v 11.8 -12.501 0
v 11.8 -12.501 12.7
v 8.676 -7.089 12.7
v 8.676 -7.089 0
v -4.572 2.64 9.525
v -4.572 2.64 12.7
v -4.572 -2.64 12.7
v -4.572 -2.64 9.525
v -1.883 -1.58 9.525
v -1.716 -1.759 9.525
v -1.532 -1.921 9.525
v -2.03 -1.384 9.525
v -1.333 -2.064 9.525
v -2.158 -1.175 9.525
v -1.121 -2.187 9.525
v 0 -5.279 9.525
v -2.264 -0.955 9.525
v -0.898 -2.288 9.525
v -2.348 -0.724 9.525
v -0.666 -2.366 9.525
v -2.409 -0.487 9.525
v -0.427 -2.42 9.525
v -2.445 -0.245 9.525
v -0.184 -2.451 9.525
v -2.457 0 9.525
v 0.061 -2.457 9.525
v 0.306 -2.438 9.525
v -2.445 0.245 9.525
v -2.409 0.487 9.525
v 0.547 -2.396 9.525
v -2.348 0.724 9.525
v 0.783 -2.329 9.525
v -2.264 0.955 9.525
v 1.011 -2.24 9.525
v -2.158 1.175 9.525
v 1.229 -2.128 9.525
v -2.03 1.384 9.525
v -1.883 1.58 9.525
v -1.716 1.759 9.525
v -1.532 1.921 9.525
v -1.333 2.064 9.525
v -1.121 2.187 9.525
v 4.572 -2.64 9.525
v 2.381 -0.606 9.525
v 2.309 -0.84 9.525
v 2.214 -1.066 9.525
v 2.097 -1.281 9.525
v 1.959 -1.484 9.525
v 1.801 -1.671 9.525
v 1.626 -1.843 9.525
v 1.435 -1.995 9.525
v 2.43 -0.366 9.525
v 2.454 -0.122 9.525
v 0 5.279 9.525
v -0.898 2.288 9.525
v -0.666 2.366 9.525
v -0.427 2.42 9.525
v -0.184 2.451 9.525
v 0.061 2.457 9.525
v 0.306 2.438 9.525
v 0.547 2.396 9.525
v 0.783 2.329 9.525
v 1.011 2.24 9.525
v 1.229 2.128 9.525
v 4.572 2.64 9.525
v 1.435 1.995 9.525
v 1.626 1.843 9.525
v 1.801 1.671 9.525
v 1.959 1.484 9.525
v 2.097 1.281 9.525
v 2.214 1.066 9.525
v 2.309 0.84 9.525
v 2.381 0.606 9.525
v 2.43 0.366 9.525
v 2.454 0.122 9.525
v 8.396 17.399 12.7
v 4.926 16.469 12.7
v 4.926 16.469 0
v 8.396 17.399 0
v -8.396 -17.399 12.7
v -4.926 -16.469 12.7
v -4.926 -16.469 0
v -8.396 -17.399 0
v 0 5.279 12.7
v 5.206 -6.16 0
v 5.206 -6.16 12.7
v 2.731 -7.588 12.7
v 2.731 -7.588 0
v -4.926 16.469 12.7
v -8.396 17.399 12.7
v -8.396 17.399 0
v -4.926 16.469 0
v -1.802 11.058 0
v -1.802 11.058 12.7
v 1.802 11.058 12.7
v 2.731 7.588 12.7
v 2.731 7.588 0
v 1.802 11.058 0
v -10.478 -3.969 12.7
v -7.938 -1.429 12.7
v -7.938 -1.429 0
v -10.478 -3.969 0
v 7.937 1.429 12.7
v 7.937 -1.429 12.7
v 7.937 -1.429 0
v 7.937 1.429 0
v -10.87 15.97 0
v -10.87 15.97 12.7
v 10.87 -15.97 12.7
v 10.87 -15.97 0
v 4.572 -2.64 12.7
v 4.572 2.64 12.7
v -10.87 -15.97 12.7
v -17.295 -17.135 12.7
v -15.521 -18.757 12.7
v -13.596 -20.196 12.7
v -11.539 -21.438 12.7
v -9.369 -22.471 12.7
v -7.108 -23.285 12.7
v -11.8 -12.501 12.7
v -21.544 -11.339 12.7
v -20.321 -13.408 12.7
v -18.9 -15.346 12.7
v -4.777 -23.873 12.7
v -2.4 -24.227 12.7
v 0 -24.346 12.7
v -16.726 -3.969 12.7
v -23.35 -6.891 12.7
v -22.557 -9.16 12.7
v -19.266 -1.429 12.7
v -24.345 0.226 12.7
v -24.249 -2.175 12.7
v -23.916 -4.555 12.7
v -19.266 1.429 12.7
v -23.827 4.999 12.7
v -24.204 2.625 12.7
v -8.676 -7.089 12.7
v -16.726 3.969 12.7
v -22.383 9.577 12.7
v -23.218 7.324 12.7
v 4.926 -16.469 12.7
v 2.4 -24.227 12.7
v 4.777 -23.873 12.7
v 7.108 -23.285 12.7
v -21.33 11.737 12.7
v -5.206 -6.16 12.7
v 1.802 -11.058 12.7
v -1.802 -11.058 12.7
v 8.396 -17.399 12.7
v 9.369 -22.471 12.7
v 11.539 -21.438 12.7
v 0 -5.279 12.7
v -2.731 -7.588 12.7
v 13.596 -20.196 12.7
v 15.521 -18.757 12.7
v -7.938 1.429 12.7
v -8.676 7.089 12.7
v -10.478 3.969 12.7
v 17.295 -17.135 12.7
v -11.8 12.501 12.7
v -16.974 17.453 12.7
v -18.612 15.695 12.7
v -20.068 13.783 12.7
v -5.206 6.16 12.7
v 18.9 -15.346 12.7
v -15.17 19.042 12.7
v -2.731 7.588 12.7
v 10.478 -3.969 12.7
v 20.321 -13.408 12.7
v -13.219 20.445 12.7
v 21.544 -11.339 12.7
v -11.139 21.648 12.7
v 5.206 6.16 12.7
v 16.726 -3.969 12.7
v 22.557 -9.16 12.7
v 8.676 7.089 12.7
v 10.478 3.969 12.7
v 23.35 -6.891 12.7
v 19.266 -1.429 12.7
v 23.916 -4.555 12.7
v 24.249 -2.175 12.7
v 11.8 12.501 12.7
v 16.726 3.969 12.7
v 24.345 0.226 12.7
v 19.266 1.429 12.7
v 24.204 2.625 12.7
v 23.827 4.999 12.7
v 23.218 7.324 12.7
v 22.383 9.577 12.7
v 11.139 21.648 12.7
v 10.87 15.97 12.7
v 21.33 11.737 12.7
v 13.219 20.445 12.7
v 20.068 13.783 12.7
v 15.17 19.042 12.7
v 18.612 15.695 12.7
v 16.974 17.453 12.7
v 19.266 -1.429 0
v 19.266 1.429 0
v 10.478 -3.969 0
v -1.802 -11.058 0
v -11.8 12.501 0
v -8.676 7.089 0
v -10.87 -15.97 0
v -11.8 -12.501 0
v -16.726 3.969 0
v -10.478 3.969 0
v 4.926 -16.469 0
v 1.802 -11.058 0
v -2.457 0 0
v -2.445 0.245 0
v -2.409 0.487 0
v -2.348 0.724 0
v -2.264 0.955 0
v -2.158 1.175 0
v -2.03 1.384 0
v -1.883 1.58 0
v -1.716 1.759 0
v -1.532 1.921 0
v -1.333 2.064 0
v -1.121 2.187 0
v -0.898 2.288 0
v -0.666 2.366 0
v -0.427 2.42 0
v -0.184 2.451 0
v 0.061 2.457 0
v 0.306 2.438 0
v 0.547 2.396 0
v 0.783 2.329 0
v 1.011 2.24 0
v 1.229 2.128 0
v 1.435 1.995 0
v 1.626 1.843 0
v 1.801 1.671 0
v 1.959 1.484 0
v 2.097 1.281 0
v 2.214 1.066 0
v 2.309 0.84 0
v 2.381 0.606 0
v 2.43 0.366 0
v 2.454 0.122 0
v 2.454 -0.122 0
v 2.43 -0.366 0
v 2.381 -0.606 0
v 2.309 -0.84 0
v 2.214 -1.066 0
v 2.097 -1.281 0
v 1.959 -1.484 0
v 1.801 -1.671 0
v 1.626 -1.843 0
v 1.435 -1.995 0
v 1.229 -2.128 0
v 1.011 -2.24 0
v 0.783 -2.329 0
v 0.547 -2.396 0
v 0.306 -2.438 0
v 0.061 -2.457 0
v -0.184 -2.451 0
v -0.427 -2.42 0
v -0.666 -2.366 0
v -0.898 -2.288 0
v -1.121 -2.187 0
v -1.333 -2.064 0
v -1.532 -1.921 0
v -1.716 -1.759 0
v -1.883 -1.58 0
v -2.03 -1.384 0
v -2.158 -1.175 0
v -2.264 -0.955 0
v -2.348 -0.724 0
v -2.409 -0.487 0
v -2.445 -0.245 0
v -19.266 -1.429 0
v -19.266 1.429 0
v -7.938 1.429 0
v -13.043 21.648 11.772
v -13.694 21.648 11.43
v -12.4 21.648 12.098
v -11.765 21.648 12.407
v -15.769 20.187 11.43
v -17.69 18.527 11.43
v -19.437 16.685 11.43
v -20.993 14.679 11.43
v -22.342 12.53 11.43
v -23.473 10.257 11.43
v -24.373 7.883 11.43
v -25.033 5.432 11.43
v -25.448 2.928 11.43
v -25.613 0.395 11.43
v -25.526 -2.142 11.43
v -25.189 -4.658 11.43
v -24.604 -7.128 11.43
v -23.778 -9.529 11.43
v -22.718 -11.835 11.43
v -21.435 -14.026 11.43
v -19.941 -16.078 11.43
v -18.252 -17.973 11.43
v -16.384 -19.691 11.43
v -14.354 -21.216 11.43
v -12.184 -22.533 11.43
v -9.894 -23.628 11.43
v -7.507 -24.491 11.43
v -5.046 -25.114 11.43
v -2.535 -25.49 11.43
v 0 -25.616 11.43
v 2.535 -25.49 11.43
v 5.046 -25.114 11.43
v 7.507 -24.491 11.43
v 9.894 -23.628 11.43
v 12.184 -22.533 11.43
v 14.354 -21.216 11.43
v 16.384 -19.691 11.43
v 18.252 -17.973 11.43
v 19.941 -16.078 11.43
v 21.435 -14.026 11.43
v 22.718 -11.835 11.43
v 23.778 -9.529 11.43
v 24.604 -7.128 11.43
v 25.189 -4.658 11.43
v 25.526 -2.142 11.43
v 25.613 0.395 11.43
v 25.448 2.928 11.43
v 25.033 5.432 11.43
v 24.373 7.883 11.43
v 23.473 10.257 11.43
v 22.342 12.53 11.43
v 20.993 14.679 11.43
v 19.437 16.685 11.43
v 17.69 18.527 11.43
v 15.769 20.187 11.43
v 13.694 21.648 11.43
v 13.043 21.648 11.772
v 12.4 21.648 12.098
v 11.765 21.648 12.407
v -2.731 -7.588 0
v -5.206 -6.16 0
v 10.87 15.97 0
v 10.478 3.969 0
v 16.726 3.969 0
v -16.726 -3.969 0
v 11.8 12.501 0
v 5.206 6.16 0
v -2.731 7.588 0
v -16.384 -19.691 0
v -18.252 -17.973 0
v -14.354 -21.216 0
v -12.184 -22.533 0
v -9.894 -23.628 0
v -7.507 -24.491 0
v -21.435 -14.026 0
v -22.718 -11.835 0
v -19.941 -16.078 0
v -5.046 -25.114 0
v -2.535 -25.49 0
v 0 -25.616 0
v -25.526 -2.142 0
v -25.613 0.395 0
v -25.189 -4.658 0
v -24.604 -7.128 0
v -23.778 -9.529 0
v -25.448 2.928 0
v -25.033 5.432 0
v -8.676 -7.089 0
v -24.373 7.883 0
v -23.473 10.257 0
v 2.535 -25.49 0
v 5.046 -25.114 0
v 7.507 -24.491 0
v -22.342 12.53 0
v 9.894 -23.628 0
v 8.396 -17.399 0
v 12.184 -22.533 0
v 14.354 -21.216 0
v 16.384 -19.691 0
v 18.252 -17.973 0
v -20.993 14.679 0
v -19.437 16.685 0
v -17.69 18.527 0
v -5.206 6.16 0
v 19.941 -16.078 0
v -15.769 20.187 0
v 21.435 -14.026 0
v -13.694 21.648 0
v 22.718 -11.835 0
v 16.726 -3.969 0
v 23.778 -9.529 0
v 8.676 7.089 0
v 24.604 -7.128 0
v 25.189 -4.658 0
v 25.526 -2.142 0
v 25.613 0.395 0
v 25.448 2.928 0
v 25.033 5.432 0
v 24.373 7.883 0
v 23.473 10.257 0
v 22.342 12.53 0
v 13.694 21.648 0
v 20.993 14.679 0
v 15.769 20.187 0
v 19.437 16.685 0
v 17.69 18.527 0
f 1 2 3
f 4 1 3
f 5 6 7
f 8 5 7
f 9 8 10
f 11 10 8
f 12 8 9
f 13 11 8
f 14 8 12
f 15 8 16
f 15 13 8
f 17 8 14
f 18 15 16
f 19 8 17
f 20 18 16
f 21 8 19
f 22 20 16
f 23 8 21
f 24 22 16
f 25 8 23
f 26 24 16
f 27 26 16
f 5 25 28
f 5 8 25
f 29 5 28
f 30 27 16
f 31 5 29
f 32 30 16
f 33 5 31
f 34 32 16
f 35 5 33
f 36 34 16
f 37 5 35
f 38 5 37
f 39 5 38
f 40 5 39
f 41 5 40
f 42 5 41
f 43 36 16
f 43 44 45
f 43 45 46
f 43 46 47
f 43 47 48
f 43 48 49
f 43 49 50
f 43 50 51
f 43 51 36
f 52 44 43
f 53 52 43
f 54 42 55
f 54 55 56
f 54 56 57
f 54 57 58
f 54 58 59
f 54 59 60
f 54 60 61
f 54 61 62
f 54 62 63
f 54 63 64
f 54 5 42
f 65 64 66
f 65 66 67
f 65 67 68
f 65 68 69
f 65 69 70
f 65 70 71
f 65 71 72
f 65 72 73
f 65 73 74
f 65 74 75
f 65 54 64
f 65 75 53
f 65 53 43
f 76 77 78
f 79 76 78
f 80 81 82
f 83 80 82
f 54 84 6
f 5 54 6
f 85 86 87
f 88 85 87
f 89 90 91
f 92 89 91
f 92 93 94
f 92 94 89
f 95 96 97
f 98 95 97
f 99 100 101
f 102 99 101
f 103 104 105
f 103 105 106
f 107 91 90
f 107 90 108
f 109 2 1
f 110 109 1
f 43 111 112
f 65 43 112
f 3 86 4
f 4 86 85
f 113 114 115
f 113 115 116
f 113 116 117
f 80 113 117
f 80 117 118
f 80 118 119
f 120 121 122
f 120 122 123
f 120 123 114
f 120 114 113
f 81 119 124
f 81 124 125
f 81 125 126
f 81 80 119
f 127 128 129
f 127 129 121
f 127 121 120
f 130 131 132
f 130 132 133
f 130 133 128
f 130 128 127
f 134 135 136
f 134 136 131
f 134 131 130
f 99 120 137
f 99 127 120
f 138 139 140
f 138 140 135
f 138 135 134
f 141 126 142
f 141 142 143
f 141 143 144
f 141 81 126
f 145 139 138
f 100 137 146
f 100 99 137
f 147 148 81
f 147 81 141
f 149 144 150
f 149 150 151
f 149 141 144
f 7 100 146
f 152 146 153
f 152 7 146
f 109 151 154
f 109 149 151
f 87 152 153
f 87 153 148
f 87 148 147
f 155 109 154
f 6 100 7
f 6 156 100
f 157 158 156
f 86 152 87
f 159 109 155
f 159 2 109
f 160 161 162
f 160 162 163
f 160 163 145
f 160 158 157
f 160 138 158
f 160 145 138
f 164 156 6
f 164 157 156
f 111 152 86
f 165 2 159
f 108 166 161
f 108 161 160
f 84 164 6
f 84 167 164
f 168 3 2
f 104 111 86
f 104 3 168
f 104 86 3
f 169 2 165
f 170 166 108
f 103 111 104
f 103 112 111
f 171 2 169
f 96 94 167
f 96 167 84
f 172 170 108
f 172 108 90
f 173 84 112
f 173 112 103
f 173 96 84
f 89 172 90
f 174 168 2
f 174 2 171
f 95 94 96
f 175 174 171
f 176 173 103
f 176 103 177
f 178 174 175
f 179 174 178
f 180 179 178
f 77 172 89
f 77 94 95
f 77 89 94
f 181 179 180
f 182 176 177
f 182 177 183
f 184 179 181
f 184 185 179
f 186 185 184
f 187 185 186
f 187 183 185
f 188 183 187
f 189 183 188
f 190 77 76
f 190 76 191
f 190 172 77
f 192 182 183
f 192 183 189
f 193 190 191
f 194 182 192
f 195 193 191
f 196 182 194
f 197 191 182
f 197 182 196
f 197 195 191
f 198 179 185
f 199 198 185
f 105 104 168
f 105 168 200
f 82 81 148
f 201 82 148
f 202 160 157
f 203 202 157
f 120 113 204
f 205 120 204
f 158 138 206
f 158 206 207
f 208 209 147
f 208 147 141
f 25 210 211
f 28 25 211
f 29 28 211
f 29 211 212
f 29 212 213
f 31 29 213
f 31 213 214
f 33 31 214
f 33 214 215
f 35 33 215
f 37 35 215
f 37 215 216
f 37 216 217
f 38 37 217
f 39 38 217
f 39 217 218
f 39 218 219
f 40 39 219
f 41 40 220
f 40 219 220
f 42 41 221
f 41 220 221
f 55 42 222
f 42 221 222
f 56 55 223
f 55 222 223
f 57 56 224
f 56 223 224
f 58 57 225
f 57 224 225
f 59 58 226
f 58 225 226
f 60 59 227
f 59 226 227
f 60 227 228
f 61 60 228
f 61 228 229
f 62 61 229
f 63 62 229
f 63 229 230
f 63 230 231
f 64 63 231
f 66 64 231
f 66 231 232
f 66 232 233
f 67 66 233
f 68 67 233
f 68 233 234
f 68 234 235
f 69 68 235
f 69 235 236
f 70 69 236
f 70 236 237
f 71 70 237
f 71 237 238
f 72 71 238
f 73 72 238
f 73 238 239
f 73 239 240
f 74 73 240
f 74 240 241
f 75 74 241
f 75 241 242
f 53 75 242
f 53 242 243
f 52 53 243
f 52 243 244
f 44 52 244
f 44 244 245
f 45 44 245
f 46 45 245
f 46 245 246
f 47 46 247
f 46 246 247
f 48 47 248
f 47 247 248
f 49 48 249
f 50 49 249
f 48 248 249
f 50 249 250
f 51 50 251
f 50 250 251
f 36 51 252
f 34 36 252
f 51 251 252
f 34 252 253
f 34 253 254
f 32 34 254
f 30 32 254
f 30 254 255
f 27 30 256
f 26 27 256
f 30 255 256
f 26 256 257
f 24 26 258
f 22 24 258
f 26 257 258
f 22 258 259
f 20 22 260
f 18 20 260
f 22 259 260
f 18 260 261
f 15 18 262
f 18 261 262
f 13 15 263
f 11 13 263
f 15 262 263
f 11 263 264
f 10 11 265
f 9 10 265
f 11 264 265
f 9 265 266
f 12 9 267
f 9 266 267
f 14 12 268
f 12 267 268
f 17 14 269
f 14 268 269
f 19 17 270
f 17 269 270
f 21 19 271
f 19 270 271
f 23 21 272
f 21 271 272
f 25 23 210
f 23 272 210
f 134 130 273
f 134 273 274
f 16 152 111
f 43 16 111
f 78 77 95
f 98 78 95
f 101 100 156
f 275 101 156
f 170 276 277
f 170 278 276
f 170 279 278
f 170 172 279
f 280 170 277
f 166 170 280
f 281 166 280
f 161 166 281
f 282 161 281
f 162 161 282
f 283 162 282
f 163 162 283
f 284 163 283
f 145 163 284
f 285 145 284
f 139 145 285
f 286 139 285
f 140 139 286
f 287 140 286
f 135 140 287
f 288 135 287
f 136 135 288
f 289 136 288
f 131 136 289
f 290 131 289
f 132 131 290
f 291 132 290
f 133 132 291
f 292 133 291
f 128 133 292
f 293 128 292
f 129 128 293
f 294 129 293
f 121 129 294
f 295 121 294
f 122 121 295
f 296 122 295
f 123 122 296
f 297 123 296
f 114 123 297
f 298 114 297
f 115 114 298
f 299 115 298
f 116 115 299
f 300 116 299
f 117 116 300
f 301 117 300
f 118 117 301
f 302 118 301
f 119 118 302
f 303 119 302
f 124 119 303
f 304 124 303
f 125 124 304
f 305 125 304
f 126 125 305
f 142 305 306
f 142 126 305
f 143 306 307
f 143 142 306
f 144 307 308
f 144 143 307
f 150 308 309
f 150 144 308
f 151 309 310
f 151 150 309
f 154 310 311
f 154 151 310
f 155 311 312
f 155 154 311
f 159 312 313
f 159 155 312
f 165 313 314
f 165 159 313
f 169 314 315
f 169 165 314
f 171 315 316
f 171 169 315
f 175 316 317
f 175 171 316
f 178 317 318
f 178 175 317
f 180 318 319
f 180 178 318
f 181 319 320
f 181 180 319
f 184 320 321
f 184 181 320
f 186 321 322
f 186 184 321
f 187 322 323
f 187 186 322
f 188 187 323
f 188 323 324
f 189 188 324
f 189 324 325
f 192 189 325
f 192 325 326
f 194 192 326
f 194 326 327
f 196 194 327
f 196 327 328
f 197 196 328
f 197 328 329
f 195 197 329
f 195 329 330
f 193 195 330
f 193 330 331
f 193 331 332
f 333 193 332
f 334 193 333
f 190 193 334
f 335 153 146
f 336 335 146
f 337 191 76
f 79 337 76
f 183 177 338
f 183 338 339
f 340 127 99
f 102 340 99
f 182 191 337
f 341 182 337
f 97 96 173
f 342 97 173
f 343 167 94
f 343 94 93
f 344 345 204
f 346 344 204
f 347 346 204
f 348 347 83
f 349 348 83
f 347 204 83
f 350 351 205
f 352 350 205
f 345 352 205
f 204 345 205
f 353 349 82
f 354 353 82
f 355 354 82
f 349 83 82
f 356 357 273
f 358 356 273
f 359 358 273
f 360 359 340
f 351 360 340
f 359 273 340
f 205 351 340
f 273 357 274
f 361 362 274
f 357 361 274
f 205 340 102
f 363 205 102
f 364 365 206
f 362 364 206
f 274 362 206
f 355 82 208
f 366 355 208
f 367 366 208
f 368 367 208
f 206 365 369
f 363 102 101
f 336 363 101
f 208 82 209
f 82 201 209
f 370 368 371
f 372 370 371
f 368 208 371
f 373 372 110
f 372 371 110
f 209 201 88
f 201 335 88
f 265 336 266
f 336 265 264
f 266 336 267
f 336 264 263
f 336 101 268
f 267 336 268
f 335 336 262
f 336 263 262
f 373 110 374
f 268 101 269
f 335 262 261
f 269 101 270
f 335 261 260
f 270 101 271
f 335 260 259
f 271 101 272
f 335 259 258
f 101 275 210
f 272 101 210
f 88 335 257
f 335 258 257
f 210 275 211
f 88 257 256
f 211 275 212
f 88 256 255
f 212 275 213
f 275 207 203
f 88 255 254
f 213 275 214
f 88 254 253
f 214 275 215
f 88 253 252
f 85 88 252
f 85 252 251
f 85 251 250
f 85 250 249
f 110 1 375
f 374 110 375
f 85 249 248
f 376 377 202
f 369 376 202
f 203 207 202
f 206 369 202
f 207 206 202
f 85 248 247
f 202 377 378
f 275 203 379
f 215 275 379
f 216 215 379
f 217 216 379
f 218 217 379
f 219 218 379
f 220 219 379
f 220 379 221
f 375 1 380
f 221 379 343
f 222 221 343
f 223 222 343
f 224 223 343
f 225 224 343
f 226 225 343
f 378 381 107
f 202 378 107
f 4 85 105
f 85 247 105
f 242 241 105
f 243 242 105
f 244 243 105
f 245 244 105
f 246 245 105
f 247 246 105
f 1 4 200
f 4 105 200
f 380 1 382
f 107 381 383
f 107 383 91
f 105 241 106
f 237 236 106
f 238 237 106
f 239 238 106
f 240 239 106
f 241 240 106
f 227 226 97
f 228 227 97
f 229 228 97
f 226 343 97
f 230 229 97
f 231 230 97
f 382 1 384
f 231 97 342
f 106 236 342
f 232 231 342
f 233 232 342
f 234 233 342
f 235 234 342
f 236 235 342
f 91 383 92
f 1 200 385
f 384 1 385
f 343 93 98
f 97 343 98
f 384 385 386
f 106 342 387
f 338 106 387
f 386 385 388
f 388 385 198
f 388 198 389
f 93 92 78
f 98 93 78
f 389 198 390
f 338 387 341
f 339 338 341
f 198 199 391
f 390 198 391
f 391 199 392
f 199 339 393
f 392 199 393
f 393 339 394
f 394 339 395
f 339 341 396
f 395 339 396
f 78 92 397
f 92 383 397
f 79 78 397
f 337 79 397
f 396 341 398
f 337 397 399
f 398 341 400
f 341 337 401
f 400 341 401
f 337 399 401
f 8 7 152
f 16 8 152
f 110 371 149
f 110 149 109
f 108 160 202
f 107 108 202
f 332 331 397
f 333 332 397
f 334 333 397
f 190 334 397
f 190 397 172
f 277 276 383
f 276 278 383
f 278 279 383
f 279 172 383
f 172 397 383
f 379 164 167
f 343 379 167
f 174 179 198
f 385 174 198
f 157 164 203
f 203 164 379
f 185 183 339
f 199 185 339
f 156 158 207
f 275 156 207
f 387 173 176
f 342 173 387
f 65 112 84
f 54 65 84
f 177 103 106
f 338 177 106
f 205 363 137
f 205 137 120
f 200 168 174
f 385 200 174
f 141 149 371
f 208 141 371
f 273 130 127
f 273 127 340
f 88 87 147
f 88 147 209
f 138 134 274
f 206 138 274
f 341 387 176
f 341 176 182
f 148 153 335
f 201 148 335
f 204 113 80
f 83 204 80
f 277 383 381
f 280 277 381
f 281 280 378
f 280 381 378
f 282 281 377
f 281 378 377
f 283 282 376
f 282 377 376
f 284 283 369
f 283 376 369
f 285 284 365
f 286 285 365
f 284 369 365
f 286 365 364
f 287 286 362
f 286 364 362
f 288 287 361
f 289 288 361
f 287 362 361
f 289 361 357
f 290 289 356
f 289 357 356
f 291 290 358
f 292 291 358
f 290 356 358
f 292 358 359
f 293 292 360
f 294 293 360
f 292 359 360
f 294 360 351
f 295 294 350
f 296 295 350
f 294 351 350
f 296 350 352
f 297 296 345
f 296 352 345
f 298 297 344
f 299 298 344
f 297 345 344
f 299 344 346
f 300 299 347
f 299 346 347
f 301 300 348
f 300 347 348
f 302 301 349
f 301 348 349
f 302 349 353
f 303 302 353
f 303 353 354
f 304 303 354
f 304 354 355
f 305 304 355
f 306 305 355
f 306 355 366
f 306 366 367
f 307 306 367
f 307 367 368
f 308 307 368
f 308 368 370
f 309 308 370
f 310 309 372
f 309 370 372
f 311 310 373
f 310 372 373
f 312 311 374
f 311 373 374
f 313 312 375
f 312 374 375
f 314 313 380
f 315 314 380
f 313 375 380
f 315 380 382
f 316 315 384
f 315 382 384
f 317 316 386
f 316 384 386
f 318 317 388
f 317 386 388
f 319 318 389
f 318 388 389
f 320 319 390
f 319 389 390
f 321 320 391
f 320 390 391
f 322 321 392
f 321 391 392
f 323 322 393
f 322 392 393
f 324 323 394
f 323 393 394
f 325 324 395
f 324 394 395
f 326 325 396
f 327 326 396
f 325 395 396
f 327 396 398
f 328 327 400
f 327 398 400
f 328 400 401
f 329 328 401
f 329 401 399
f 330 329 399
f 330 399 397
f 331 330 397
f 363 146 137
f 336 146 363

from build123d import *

# Parameters (mm, degrees)
BOSS_EXTRUDE1_DEPTH     = 12.7
CHAMFER1_SIZE           = 1.27
CUT_EXTRUDE1_DEPTH      = 3.175
F_8_CLEARANCE_HOLE1_D   = 4.9149
SKETCH5_W               = 11.3284
SKETCH5_H               = 7.9375
CUT_EXTRUDE_THIN1_DEPTH = 39.388001584
CHAMFER2_SIZE           = 2.54


with BuildPart() as part:
    # Sketch1 → Boss-Extrude1 (new body)
    with BuildSketch(Plane.XY):
        with BuildLine():
            Line((13.693796063, 21.648424474), (-13.693796063, 21.648424474))
            ThreePointArc((-13.693796063, 21.648424474), (0, -25.6159), (13.693796063, 21.648424474))
        make_face()
    extrude(amount=BOSS_EXTRUDE1_DEPTH)

    # Chamfer1
    chamfer1_edges = [part.edges().sort_by_distance(p)[0] for p in [
        (0, -25.6159, 12.7),
    ]]
    chamfer(chamfer1_edges, length=CHAMFER1_SIZE)

    # Sketch2 → Cut-Extrude1 (cut)
    with BuildSketch(Plane.XY.offset(12.7)):
        Polygon((-4.572, -2.639645431), (0, -5.279290861), (4.572, -2.639645431), (4.572, 2.639645431), (0, 5.279290861), (-4.572, 2.639645431), align=None)
    extrude(amount=-CUT_EXTRUDE1_DEPTH, mode=Mode.SUBTRACT)

    # #8 Clearance Hole1 (through all)
    with Locations(Plane.XY.offset(12.7)):
        with Locations((0, 0)):
            Hole(F_8_CLEARANCE_HOLE1_D / 2)

    # Sketch5 → Cut-Extrude-Thin1 (cut, through all)
    with BuildSketch(Plane.XY.offset(12.7)):
        Polygon((-7.405788321, -4.889701643), (-13.069988321, -14.700383827), (-6.195911679, -18.669133827), (-0.531711679, -8.858451643), align=None)
        with Locations((-13.6017, 0)):
            Rectangle(SKETCH5_W, SKETCH5_H)
        Polygon((-0.531711679, 8.858451643), (-6.195911679, 18.669133827), (-13.069988321, 14.700383827), (-7.405788321, 4.889701643), align=None)
        Polygon((7.405788321, 4.889701643), (13.069988321, 14.700383827), (6.195911679, 18.669133827), (0.531711679, 8.858451643), align=None)
        with Locations((13.6017, 0)):
            Rectangle(SKETCH5_W, SKETCH5_H)
        Polygon((0.531711679, -8.858451643), (6.195911679, -18.669133827), (13.069988321, -14.700383827), (7.405788321, -4.889701643), align=None)
    extrude(amount=-CUT_EXTRUDE_THIN1_DEPTH, mode=Mode.SUBTRACT)

    # Chamfer2
    chamfer2_edges = [part.edges().sort_by_distance(p)[0] for p in [
        (6.195911679, -18.669133827, 6.35),
        (0.531711679, -8.858451643, 6.35),
        (7.405788321, -4.889701643, 6.35),
        (13.069988321, -14.700383827, 6.35),
        (19.2659, -3.96875, 6.35),
        (7.9375, -3.96875, 6.35),
        (7.9375, 3.96875, 6.35),
        (19.2659, 3.96875, 6.35),
        (13.069988321, 14.700383827, 6.35),
        (7.405788321, 4.889701643, 6.35),
        (0.531711679, 8.858451643, 6.35),
        (6.195911679, 18.669133827, 6.35),
        (-6.195911679, 18.669133827, 6.35),
        (-0.531711679, 8.858451643, 6.35),
        (-7.405788321, 4.889701643, 6.35),
        (-13.069988321, 14.700383827, 6.35),
        (-19.2659, 3.96875, 6.35),
        (-7.9375, 3.96875, 6.35),
        (-7.9375, -3.96875, 6.35),
        (-19.2659, -3.96875, 6.35),
        (-13.069988321, -14.700383827, 6.35),
        (-7.405788321, -4.889701643, 6.35),
        (-0.531711679, -8.858451643, 6.35),
        (-6.195911679, -18.669133827, 6.35),
    ]]
    chamfer(chamfer2_edges, length=CHAMFER2_SIZE)


solid = part.part
